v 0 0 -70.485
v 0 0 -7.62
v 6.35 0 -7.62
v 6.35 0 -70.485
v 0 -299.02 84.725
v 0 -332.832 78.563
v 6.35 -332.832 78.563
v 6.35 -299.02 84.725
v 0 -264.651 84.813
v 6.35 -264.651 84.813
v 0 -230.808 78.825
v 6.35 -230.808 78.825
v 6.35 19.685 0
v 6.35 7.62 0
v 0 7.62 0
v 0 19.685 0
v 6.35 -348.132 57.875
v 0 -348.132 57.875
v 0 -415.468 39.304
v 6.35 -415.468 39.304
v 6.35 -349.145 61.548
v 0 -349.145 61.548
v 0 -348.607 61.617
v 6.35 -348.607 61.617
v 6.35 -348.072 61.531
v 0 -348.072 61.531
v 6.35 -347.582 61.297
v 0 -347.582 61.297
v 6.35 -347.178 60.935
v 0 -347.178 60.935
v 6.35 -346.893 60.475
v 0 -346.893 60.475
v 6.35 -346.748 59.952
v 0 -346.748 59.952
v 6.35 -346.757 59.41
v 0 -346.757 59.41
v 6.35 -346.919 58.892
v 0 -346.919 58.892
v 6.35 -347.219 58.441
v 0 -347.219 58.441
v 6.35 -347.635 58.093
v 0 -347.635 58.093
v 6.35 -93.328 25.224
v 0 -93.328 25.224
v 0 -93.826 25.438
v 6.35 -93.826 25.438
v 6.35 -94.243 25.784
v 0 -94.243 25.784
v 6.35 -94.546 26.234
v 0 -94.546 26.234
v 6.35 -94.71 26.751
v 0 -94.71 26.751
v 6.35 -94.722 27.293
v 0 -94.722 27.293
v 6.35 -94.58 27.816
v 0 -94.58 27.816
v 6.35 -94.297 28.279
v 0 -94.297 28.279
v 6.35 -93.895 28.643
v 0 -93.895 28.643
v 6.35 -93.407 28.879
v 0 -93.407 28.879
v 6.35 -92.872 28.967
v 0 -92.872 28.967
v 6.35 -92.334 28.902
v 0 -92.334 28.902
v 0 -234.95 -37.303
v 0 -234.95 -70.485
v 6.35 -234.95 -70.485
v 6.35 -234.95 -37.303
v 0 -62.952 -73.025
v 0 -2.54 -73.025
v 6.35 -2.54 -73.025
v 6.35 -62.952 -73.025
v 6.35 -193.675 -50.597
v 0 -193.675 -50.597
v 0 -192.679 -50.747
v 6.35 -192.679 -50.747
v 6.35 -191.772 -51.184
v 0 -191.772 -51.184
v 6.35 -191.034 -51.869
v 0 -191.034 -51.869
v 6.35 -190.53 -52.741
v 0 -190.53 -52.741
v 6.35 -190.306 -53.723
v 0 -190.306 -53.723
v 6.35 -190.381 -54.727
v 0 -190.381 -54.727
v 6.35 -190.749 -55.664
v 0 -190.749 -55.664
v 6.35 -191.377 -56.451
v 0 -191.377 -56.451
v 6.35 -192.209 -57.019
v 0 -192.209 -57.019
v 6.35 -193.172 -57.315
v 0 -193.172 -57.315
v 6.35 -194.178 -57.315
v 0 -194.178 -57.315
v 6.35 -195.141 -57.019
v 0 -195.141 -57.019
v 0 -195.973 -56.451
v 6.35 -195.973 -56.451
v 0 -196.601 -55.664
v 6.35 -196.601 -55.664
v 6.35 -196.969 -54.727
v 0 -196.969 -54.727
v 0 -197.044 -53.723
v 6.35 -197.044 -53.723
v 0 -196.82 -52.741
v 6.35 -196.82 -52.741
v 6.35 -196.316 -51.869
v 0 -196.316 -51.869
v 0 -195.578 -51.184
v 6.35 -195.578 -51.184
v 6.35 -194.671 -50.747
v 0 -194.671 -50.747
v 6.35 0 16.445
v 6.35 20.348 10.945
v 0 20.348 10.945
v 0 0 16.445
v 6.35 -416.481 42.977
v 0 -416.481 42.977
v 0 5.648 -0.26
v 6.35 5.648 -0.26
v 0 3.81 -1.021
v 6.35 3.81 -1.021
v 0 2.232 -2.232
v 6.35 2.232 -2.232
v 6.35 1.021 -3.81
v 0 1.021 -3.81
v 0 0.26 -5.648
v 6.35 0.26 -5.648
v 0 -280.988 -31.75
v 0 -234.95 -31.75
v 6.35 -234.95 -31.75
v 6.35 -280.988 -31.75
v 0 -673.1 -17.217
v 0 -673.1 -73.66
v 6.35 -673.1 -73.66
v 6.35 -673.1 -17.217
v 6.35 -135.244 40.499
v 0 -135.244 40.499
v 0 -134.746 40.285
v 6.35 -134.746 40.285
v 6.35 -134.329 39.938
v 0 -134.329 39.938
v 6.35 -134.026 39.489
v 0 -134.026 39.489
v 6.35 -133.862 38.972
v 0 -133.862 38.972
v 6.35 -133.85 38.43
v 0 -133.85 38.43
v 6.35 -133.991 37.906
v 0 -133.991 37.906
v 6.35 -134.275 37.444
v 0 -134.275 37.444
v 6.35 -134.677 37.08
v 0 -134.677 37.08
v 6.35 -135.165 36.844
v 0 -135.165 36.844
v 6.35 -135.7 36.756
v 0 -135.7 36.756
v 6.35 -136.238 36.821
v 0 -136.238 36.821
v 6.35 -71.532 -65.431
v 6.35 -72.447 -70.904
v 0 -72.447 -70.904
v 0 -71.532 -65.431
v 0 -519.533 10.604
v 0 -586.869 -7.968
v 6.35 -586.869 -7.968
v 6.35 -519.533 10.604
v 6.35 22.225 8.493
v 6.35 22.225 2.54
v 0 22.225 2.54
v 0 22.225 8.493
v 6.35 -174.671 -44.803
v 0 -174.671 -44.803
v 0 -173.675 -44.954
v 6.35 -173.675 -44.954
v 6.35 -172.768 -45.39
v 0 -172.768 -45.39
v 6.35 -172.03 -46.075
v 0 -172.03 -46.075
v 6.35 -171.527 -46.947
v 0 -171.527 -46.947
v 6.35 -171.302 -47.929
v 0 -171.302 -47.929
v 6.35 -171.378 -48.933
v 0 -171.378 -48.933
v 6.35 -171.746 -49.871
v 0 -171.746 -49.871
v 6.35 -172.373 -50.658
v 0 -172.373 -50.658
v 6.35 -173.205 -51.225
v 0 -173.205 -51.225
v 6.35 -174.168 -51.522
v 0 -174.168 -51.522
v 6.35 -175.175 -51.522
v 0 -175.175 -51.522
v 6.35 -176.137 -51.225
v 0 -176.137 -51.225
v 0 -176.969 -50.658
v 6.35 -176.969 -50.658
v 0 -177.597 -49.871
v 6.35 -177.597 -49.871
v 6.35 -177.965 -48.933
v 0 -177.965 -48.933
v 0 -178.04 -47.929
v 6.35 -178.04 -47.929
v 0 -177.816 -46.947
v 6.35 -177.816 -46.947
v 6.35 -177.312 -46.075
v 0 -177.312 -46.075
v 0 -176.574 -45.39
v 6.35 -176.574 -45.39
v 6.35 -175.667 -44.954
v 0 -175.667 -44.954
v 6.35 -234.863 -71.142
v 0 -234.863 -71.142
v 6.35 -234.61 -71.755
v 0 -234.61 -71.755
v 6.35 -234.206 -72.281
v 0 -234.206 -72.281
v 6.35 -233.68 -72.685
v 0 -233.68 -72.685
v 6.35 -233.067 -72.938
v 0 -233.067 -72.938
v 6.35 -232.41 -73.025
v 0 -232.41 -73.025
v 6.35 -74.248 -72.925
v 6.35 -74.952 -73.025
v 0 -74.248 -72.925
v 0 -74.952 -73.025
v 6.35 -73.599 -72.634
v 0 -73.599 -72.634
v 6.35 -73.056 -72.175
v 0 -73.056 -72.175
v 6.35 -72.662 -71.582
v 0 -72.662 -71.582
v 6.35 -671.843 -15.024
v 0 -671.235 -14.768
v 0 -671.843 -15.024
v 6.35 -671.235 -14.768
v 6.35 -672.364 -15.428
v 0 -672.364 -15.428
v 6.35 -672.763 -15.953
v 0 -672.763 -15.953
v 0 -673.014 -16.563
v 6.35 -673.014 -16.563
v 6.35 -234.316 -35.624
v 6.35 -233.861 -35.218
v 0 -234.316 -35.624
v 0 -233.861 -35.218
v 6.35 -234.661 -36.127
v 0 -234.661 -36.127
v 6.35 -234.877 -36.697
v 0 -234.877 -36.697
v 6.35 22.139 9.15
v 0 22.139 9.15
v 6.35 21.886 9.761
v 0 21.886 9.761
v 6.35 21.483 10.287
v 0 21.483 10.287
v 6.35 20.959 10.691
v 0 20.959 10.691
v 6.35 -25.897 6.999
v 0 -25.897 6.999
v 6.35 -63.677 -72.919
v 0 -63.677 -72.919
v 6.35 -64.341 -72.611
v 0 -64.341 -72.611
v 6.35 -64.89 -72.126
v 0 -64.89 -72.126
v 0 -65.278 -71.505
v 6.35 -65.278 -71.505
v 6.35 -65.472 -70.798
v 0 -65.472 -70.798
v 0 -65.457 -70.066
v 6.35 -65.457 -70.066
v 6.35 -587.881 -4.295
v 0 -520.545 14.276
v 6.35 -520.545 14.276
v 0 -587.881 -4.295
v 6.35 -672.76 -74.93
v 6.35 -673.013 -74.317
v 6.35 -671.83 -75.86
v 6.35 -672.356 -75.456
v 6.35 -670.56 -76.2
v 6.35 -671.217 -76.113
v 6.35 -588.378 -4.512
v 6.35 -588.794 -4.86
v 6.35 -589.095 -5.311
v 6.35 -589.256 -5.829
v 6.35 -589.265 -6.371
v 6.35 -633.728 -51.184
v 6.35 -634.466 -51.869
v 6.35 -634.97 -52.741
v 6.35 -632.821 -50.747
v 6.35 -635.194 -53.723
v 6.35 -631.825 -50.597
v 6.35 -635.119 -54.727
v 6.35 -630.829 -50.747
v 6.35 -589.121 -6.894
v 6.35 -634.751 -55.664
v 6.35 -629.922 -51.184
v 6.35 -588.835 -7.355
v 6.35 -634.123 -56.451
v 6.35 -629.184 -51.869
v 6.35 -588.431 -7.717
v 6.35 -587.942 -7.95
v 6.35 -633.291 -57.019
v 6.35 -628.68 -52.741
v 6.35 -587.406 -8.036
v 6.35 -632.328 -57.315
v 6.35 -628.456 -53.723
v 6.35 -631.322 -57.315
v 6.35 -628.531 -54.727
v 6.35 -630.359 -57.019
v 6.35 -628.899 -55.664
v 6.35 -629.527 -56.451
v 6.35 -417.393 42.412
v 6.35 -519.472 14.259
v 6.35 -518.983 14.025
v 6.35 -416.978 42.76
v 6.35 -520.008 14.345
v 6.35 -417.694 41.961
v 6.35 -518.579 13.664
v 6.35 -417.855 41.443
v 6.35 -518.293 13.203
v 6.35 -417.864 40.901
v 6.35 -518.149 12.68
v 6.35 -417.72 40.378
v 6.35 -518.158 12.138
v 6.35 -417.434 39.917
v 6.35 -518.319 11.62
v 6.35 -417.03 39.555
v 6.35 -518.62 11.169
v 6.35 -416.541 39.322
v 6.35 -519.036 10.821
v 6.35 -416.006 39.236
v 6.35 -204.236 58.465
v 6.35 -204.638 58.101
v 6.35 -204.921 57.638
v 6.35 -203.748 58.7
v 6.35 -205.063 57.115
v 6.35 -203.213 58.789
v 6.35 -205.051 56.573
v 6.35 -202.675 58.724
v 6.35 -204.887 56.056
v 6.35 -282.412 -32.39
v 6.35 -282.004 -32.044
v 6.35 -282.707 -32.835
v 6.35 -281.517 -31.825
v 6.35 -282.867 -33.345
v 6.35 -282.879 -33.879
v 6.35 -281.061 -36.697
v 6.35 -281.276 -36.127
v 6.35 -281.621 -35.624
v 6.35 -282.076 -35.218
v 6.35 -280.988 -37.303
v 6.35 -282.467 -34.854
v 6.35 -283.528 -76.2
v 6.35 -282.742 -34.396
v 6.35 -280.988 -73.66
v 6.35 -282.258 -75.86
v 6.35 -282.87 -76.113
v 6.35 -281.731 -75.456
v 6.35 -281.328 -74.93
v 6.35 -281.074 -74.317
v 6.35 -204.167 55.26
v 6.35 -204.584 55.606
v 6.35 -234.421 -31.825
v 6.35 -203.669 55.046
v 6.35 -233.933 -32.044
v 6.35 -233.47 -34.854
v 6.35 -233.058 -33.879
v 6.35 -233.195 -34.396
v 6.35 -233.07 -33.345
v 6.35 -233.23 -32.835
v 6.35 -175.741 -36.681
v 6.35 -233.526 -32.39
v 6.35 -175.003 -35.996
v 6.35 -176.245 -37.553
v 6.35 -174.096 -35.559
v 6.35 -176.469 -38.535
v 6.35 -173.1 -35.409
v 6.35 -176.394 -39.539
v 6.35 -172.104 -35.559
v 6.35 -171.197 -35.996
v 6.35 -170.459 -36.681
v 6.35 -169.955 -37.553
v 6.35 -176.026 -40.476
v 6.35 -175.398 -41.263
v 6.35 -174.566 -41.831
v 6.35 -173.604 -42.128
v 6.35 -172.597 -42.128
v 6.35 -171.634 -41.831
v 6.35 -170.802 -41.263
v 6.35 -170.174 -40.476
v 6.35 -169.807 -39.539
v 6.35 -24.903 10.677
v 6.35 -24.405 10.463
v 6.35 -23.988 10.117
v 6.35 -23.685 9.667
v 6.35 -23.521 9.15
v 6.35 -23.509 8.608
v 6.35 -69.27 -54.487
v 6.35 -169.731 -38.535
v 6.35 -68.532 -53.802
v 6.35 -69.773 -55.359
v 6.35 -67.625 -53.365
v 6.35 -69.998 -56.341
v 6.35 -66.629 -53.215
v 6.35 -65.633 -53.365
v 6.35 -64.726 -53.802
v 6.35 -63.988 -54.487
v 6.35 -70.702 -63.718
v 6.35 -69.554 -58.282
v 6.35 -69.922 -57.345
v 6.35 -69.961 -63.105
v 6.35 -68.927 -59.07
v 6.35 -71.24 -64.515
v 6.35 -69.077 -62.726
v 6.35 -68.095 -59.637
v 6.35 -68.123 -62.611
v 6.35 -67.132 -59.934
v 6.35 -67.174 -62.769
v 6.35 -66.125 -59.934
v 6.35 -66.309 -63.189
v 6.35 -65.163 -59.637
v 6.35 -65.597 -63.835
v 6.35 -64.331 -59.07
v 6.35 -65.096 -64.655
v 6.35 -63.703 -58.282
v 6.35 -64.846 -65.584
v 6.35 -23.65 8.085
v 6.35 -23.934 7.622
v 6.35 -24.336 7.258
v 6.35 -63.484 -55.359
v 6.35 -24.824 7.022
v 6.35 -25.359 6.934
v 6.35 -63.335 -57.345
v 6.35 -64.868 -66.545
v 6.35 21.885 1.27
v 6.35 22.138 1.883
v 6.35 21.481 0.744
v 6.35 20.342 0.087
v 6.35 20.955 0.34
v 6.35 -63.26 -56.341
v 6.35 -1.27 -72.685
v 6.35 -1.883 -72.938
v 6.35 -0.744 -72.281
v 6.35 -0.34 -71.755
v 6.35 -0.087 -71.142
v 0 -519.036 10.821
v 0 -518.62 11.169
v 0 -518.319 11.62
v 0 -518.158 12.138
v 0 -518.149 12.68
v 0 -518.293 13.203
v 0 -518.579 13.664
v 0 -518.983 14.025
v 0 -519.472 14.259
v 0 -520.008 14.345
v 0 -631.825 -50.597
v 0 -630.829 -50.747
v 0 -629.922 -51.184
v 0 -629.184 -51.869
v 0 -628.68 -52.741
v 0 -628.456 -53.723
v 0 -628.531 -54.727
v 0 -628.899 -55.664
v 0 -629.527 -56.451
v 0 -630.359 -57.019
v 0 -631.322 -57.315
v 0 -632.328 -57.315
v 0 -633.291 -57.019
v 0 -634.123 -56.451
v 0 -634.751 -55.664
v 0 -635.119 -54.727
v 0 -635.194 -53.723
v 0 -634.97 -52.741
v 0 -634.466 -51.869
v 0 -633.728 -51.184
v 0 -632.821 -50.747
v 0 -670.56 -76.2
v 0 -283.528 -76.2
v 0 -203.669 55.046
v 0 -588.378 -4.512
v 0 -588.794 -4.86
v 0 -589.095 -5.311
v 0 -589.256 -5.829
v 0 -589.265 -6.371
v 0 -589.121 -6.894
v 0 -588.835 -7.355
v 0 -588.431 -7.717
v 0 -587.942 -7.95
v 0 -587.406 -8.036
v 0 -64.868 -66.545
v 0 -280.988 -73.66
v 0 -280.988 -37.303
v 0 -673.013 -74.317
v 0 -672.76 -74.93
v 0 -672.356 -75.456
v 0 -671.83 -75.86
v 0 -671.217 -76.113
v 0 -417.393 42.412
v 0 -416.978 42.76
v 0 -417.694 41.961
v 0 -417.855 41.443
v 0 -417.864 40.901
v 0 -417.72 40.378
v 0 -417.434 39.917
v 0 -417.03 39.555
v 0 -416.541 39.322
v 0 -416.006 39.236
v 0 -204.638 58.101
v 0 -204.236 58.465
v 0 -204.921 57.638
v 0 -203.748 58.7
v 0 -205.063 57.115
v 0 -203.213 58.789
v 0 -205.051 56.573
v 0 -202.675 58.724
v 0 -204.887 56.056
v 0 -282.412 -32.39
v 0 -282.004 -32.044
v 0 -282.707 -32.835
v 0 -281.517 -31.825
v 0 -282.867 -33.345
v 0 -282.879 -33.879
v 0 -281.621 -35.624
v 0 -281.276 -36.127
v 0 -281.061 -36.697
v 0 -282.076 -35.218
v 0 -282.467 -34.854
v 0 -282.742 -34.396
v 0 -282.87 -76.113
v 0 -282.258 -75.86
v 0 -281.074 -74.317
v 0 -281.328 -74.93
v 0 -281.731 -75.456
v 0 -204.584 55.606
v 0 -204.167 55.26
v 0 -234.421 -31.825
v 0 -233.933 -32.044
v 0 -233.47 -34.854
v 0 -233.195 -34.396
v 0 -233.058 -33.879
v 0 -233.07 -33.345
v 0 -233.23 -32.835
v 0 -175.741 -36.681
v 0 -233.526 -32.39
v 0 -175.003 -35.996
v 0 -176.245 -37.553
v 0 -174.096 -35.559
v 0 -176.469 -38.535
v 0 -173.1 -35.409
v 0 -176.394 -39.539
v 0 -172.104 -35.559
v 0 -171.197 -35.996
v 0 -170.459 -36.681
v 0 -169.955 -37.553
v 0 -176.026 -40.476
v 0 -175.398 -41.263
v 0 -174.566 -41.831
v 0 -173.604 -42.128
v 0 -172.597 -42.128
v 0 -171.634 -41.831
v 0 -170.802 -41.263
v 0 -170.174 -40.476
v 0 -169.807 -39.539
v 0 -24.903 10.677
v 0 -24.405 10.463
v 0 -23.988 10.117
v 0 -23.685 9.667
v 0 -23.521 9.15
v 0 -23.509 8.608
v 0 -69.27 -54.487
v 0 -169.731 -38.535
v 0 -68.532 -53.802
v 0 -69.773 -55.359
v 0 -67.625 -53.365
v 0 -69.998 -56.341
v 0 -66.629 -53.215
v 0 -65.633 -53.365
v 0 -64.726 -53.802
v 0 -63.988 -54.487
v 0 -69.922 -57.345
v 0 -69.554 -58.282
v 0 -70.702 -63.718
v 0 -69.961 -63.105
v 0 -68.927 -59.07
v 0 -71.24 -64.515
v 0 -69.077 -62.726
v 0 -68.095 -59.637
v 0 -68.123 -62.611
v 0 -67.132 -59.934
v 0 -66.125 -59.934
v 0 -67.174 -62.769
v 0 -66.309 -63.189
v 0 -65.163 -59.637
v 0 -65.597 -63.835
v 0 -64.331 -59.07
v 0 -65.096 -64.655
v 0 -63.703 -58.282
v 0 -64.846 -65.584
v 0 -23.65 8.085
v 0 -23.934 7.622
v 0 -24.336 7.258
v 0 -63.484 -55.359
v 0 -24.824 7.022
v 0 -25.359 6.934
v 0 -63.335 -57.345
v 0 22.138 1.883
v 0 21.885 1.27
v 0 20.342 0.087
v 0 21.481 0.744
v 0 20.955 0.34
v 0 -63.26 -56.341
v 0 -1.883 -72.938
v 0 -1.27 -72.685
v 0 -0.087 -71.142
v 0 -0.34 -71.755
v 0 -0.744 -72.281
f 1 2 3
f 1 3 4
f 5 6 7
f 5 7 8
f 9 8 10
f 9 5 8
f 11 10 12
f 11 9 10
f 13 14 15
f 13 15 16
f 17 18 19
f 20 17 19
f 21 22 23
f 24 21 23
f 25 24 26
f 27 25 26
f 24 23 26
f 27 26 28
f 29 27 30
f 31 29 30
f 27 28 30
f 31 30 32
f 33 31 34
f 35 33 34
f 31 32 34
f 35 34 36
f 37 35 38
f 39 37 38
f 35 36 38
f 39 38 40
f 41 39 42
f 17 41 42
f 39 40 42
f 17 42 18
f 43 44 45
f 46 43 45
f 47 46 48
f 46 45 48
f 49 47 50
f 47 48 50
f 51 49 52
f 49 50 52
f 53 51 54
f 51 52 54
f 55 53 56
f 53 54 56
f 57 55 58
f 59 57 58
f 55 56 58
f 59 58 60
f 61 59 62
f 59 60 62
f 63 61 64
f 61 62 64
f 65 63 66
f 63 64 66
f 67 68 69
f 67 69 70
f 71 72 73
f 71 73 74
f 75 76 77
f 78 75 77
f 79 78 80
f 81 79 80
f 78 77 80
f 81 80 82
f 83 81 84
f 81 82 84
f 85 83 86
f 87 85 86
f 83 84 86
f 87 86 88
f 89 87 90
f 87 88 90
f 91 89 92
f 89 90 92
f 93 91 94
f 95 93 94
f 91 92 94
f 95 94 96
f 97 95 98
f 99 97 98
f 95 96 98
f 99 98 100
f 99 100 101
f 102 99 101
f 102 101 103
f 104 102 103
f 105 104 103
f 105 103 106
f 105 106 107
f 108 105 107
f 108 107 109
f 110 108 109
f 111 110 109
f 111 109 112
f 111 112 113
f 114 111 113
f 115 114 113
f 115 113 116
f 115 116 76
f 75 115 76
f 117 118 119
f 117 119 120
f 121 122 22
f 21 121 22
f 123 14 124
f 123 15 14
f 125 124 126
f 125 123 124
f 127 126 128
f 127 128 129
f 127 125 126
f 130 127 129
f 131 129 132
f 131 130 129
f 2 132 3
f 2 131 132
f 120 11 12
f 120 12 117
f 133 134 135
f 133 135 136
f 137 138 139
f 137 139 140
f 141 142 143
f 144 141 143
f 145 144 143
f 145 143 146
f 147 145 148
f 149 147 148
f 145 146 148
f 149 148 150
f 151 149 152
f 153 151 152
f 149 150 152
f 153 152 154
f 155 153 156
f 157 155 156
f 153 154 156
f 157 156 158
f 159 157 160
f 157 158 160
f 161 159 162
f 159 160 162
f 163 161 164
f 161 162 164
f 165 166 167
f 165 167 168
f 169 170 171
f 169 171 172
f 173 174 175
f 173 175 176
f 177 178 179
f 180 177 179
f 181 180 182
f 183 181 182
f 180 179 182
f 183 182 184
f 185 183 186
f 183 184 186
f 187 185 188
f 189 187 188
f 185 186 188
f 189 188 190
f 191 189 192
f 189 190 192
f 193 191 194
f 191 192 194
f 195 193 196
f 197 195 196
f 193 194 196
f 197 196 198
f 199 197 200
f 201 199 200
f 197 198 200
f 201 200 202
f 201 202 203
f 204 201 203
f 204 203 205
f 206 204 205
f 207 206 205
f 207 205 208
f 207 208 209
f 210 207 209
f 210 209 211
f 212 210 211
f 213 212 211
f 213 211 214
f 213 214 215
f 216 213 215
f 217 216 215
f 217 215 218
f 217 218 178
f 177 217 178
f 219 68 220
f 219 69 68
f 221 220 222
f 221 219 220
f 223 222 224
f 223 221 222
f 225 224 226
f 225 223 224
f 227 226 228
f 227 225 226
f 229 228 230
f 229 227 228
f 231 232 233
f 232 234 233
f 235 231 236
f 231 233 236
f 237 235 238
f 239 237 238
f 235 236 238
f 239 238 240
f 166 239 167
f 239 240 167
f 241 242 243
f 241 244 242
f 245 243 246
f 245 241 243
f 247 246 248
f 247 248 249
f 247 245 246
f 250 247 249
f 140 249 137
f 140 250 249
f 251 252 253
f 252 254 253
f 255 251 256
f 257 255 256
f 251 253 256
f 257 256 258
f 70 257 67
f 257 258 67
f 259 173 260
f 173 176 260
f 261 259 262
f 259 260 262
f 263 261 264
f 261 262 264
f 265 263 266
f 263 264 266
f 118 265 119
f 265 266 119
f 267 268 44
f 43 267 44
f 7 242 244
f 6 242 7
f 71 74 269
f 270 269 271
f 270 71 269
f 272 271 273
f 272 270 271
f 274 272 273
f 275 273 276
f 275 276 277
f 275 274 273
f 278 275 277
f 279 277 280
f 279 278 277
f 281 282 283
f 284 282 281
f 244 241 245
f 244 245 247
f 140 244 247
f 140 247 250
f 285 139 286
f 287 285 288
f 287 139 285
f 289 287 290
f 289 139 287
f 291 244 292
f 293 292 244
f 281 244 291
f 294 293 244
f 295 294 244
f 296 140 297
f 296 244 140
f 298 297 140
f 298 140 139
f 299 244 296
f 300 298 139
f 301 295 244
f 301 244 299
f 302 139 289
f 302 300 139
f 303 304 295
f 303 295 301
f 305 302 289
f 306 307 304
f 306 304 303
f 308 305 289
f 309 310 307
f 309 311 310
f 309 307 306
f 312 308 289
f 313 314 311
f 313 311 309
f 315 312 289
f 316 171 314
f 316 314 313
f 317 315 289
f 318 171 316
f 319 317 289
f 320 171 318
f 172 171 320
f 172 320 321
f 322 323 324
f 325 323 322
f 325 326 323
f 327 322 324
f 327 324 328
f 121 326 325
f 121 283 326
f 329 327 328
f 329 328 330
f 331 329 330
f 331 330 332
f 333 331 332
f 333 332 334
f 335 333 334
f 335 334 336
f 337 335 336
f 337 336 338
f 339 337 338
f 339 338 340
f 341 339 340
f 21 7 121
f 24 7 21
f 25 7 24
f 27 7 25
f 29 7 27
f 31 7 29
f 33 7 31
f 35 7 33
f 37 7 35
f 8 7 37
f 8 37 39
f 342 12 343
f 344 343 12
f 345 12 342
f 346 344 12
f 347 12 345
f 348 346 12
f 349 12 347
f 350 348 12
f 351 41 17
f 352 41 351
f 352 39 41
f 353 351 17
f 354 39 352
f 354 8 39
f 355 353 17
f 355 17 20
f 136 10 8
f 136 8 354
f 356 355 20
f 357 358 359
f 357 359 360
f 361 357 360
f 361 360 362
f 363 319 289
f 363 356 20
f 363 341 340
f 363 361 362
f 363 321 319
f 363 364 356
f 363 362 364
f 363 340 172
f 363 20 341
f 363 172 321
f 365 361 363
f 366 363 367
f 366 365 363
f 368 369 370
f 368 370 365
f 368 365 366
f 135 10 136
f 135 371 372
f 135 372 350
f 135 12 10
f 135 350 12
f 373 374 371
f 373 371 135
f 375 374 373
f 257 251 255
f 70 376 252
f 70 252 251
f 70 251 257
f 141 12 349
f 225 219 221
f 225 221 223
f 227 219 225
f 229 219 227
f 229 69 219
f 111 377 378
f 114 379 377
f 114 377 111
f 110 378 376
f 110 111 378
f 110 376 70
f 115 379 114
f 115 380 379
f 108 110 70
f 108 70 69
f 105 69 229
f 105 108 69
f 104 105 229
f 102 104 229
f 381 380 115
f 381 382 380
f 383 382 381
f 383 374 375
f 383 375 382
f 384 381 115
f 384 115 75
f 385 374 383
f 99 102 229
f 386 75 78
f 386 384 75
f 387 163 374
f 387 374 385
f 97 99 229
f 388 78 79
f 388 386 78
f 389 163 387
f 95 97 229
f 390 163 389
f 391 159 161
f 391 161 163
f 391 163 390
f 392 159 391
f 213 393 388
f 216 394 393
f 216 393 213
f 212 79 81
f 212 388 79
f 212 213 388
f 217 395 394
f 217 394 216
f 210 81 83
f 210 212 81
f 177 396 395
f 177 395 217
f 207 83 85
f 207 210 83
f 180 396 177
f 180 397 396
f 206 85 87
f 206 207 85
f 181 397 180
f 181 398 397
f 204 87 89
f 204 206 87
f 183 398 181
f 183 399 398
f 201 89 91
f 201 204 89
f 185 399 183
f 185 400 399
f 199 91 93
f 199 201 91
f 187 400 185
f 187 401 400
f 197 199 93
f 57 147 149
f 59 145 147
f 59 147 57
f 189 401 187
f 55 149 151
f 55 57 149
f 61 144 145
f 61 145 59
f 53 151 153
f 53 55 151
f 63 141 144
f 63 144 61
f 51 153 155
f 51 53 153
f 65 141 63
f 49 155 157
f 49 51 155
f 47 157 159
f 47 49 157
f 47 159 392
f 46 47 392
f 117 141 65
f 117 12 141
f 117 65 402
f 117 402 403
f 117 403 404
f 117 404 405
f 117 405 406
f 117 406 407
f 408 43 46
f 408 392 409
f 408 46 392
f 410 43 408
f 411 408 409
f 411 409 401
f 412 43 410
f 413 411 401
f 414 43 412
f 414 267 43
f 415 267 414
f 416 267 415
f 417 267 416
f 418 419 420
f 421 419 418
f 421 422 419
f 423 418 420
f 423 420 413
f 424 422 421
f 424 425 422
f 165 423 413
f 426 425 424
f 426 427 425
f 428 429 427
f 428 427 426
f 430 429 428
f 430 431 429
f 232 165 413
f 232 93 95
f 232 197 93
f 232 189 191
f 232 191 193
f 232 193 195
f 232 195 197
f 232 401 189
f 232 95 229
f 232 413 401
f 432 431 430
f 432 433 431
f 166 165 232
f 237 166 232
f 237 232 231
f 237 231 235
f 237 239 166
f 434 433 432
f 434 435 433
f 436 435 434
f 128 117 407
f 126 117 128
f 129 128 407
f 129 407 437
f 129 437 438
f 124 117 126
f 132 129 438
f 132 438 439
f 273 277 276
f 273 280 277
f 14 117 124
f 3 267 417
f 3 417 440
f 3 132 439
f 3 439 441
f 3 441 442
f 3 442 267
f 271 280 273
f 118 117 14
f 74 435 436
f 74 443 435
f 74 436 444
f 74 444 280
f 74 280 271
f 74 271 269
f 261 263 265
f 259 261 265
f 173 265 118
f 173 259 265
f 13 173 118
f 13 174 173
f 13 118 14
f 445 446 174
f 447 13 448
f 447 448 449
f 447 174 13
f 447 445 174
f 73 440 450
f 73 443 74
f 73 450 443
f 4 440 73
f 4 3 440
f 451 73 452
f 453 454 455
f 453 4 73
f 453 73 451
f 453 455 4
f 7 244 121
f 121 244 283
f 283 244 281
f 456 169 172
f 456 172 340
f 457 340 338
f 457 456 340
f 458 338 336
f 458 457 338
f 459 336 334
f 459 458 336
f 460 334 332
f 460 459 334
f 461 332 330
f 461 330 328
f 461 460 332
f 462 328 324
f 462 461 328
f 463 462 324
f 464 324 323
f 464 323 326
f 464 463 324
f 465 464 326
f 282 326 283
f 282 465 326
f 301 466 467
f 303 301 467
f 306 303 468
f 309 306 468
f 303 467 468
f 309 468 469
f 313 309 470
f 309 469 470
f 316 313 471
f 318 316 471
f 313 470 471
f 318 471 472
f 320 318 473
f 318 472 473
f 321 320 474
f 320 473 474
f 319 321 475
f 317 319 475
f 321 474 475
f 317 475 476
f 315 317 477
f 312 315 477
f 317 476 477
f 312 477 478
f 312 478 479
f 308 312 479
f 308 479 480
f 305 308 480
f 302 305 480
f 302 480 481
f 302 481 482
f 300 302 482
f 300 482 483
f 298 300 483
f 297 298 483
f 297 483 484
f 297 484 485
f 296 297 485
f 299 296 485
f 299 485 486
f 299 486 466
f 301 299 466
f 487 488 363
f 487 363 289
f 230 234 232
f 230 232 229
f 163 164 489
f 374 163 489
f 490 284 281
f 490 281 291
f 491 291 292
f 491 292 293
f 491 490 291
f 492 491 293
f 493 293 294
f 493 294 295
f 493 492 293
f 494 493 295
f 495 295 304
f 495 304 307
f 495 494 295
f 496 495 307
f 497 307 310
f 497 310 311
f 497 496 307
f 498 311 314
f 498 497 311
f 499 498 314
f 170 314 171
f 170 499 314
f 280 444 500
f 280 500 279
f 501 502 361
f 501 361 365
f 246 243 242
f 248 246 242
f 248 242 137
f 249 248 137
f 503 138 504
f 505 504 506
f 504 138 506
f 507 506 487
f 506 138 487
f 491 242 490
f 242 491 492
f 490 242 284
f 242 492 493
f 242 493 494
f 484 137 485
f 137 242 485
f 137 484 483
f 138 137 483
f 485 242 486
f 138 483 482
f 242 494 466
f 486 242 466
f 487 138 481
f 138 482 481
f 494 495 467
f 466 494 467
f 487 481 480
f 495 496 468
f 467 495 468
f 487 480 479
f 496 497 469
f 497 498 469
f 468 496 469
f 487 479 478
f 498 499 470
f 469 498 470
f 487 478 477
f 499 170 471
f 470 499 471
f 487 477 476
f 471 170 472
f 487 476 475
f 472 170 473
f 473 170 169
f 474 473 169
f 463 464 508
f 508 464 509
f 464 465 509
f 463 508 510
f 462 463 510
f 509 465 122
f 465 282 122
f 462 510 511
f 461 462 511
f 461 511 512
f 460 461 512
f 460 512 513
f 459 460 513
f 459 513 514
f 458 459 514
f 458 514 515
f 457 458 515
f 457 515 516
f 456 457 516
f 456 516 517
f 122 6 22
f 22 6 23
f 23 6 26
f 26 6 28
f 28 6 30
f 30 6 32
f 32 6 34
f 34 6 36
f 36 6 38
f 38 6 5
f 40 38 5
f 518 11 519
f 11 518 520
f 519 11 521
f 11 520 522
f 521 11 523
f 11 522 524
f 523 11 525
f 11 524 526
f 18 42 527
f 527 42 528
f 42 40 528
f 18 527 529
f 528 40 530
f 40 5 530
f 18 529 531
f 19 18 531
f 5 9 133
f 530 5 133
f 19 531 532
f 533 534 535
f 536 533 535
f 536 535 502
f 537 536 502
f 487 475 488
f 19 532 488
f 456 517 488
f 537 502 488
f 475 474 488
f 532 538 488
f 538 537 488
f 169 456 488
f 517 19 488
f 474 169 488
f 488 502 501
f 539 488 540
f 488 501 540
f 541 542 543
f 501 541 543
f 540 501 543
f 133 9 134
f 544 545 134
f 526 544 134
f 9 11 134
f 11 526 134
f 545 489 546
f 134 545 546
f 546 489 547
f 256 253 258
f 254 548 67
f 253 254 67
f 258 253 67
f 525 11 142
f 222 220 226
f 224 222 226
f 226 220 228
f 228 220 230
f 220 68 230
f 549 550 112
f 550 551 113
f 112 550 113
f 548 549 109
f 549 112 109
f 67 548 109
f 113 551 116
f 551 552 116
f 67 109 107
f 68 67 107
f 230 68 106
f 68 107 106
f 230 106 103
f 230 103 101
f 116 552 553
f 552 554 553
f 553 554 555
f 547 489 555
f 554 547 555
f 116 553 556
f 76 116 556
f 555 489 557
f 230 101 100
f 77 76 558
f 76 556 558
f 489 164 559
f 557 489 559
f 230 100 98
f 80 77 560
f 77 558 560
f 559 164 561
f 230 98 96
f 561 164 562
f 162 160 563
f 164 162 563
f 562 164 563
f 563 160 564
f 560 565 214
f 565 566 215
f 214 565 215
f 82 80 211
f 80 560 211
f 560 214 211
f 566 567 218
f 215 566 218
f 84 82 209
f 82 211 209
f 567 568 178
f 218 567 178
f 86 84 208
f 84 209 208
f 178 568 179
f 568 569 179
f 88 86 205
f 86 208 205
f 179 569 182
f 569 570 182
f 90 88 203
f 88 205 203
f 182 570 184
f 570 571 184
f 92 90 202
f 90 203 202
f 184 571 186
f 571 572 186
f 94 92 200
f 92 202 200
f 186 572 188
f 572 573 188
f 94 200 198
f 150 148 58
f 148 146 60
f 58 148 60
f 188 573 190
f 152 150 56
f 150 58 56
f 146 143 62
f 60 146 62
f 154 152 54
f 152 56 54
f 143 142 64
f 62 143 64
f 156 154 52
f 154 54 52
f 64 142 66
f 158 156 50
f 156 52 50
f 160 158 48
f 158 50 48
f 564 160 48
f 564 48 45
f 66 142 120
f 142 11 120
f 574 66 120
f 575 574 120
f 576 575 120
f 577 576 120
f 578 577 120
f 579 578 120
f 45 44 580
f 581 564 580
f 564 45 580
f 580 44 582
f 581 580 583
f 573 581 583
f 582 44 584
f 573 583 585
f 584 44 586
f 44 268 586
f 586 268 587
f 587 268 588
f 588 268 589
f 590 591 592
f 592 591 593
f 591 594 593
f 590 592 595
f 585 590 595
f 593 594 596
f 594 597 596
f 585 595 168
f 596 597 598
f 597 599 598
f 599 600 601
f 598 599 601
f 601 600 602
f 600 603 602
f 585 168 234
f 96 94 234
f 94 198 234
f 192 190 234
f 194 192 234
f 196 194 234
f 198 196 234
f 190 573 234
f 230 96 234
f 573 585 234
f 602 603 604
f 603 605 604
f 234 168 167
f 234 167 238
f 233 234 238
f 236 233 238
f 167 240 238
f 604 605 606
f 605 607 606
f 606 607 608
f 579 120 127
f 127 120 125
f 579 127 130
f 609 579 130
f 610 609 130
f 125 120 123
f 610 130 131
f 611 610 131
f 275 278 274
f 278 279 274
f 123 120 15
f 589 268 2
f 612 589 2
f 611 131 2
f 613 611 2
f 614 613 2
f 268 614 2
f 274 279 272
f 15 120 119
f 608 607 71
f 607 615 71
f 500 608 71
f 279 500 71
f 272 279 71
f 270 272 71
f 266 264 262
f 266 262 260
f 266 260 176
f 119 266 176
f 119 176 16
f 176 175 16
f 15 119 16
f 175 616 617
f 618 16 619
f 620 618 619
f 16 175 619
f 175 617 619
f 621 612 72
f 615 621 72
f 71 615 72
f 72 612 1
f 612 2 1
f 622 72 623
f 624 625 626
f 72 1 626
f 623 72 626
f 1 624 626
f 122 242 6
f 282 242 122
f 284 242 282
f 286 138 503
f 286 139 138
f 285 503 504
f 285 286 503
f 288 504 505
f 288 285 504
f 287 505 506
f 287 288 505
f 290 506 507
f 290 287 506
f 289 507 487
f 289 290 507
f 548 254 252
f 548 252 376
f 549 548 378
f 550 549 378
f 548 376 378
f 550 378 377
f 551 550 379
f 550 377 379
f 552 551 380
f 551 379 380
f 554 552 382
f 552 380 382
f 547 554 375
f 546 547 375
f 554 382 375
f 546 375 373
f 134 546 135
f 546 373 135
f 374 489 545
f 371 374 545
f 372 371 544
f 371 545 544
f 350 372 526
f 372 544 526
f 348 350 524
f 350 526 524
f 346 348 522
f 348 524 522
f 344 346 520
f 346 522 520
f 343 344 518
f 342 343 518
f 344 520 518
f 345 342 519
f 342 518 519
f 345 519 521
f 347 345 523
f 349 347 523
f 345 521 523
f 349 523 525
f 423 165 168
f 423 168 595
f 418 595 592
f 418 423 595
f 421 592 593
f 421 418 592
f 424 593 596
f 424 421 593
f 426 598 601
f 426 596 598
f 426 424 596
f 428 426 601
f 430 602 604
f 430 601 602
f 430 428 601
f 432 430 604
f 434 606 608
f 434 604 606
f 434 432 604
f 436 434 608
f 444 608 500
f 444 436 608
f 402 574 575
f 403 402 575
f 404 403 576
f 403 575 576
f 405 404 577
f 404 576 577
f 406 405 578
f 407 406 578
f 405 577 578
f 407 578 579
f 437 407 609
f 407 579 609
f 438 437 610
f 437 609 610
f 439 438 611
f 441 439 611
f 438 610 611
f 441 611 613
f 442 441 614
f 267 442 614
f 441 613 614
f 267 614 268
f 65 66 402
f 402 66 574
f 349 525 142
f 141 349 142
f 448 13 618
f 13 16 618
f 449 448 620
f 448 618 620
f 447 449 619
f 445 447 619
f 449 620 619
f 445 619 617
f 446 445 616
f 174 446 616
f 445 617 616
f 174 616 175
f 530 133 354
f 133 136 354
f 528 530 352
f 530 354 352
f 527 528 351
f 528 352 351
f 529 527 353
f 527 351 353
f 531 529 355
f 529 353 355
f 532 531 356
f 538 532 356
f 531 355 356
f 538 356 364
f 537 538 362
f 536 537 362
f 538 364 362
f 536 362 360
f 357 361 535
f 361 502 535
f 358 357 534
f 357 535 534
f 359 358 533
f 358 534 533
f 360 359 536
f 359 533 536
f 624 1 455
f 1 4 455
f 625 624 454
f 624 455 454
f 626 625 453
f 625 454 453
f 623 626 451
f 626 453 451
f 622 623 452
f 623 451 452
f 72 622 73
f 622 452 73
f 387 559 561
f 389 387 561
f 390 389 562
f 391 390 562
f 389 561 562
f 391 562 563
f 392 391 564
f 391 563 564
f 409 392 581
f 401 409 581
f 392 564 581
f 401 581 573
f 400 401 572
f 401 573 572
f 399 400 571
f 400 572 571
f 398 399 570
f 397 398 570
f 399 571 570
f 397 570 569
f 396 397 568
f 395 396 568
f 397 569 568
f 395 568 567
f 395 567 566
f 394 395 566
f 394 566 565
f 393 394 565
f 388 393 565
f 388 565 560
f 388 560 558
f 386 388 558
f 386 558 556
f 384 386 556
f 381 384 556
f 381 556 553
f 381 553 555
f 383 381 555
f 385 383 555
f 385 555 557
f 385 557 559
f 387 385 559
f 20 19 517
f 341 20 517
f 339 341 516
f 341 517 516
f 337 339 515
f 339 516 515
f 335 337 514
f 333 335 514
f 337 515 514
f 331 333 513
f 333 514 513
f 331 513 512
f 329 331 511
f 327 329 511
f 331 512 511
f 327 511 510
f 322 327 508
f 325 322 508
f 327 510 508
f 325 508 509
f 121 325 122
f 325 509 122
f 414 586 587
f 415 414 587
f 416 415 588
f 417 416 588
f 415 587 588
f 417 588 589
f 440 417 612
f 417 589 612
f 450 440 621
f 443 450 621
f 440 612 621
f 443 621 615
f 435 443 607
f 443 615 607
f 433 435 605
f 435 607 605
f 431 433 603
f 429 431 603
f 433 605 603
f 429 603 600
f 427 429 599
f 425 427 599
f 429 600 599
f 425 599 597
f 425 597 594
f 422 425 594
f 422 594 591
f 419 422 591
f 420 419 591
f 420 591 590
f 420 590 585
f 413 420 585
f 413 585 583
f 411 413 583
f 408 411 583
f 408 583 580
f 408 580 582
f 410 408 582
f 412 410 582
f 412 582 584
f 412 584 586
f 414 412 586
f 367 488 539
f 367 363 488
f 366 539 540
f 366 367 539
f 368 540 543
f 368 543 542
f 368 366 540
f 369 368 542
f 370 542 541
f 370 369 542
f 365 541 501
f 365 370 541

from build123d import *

# Parameters (mm, degrees)
BOSS_EXTRUDE1_DEPTH     = 6.35
F_1_4_CLEARANCE_HOLE1_D = 6.7564
CUT_EXTRUDE1_DEPTH      = 679.542476995
SKETCH9_R               = 1.905
CUT_EXTRUDE2_DEPTH      = 679.542476995
BOSS_EXTRUDE2_DEPTH     = 6.35
FILLET1_R               = 2.54
FILLET2_R               = 7.62


with BuildPart() as part:
    # Sketch4 → Boss-Extrude1 (new body)
    with BuildSketch(Plane(origin=(0, 0, 0), x_dir=(0, 0, -1), z_dir=(1, 0, 0))):
        with BuildLine():
            Line((31.75, -280.9875), (76.2, -280.9875))
            Line((76.2, -280.9875), (76.2, -673.1))
            Line((76.2, -673.1), (31.75, -673.1))
            Line((31.75, -673.1), (15.282303513, -673.1))
            Line((15.282303513, -673.1), (-78.562742141, -332.832245873))
            ThreePointArc((-78.562742141, -332.832245873), (-85.532748147, -281.837746657), (-78.825143864, -230.808069226))
            Line((-78.825143864, -230.808069226), (-16.444584614, 0))
            Line((-16.444584614, 0), (0, 0))
            Line((0, 0), (73.025, 0))
            Line((73.025, 0), (73.025, -234.95))
            Line((73.025, -234.95), (31.75, -234.95))
            Line((31.75, -234.95), (31.75, -280.9875))
        make_face()
        with BuildLine():
            Line((-28.901727688, -92.33360131), (-10.677232282, -24.902968307))
            ThreePointArc((-10.677232282, -24.902968307), (-8.341183326, -23.560982736), (-6.999197755, -25.897031693))
            Line((-6.999197755, -25.897031693), (-25.223693161, -93.327664696))
            ThreePointArc((-25.223693161, -93.327664696), (-27.559742118, -94.669650267), (-28.901727688, -92.33360131))
        make_face(mode=Mode.SUBTRACT)
        with BuildLine():
            Line((-42.977227606, -416.480766903), (-61.548336892, -349.144770587))
            ThreePointArc((-61.548336892, -349.144770587), (-60.218385428, -346.801849525), (-57.875464366, -348.13180099))
            Line((-57.875464366, -348.13180099), (-39.304355079, -415.467797306))
            ThreePointArc((-39.304355079, -415.467797306), (-40.634306544, -417.810718368), (-42.977227606, -416.480766903))
        make_face(mode=Mode.SUBTRACT)
        with BuildLine():
            Line((7.967559467, -586.868515201), (-10.603549819, -519.532518885))
            ThreePointArc((-10.603549819, -519.532518885), (-12.946470881, -518.202567421), (-14.276422345, -520.545488483))
            Line((-14.276422345, -520.545488483), (4.294686941, -587.881484799))
            ThreePointArc((4.294686941, -587.881484799), (6.637608003, -589.211436263), (7.967559467, -586.868515201))
        make_face(mode=Mode.SUBTRACT)
        with BuildLine():
            Line((-58.723629262, -202.674637133), (-40.499133856, -135.24400413))
            ThreePointArc((-40.499133856, -135.24400413), (-38.163084899, -133.902018559), (-36.821099329, -136.238067516))
            Line((-36.821099329, -136.238067516), (-55.045594735, -203.668700519))
            ThreePointArc((-55.045594735, -203.668700519), (-57.381643691, -205.01068609), (-58.723629262, -202.674637133))
        make_face(mode=Mode.SUBTRACT)
    extrude(amount=BOSS_EXTRUDE1_DEPTH)

    # 1/4 Clearance Hole1 (through all)
    with Locations(Plane(origin=(6.35, 0, 0), x_dir=(0, 0, -1), z_dir=(1, 0, 0))):
        with Locations((53.975, -631.825), (53.975, -193.675), (48.181629833, -174.671224416), (38.787102693, -173.100083168), (56.593370167, -66.628775584)):
            Hole(F_1_4_CLEARANCE_HOLE1_D / 2)

    # Sketch7 → Cut-Extrude1 (cut, through all)
    with BuildSketch(Plane(origin=(6.35, 0, 0), x_dir=(0, 0, -1), z_dir=(1, 0, 0))):
        with BuildLine():
            Line((73.025, -72.801919324), (65.430665878, -71.531842458))
            ThreePointArc((65.430665878, -71.531842458), (62.655971682, -67.642685403), (66.545128736, -64.867991206))
            Line((66.545128736, -64.867991206), (73.025, -65.951685241))
            Line((73.025, -65.951685241), (73.025, -72.801919324))
        make_face()
    extrude(amount=-CUT_EXTRUDE1_DEPTH, mode=Mode.SUBTRACT)

    # Sketch9 → Cut-Extrude2 (cut, through all)
    with BuildSketch(Plane(origin=(6.35, 0, 0), x_dir=(0, 0, -1), z_dir=(1, 0, 0))):
        with Locations((33.655, -234.95)):
            Circle(SKETCH9_R)
        with Locations((33.655, -280.9875)):
            Circle(SKETCH9_R)
    extrude(amount=-CUT_EXTRUDE2_DEPTH, mode=Mode.SUBTRACT)

    # Sketch10 → Boss-Extrude2 (add)
    with BuildSketch(Plane(origin=(6.35, 0, 0), x_dir=(0, 0, -1), z_dir=(1, 0, 0))):
        Polygon((0, 0), (0, 22.225), (-10.437827857, 22.225), (-16.444584614, 0), align=None)
    extrude(amount=-BOSS_EXTRUDE2_DEPTH)

    # Fillet1
    fillet1_edges = [part.edges().sort_by_distance(p)[0] for p in [
        (3.175, -65.951685241, -73.025),
        (3.175, -72.801919324, -73.025),
        (3.175, -280.9875, -35.56),
        (3.175, -234.95, -35.56),
        (3.175, 22.225, 10.437827857),
        (3.175, 22.225, 0),
        (3.175, -280.9875, -76.2),
        (3.175, -673.1, -76.2),
        (3.175, -673.1, -15.282303513),
        (3.175, 0, -73.025),
        (3.175, -234.95, -73.025),
    ]]
    fillet(fillet1_edges, radius=FILLET1_R)

    # Fillet2
    fillet2_edges = [part.edges().sort_by_distance(p)[0] for p in [
        (3.175, 0, 0),
    ]]
    fillet(fillet2_edges, radius=FILLET2_R)


solid = part.part
